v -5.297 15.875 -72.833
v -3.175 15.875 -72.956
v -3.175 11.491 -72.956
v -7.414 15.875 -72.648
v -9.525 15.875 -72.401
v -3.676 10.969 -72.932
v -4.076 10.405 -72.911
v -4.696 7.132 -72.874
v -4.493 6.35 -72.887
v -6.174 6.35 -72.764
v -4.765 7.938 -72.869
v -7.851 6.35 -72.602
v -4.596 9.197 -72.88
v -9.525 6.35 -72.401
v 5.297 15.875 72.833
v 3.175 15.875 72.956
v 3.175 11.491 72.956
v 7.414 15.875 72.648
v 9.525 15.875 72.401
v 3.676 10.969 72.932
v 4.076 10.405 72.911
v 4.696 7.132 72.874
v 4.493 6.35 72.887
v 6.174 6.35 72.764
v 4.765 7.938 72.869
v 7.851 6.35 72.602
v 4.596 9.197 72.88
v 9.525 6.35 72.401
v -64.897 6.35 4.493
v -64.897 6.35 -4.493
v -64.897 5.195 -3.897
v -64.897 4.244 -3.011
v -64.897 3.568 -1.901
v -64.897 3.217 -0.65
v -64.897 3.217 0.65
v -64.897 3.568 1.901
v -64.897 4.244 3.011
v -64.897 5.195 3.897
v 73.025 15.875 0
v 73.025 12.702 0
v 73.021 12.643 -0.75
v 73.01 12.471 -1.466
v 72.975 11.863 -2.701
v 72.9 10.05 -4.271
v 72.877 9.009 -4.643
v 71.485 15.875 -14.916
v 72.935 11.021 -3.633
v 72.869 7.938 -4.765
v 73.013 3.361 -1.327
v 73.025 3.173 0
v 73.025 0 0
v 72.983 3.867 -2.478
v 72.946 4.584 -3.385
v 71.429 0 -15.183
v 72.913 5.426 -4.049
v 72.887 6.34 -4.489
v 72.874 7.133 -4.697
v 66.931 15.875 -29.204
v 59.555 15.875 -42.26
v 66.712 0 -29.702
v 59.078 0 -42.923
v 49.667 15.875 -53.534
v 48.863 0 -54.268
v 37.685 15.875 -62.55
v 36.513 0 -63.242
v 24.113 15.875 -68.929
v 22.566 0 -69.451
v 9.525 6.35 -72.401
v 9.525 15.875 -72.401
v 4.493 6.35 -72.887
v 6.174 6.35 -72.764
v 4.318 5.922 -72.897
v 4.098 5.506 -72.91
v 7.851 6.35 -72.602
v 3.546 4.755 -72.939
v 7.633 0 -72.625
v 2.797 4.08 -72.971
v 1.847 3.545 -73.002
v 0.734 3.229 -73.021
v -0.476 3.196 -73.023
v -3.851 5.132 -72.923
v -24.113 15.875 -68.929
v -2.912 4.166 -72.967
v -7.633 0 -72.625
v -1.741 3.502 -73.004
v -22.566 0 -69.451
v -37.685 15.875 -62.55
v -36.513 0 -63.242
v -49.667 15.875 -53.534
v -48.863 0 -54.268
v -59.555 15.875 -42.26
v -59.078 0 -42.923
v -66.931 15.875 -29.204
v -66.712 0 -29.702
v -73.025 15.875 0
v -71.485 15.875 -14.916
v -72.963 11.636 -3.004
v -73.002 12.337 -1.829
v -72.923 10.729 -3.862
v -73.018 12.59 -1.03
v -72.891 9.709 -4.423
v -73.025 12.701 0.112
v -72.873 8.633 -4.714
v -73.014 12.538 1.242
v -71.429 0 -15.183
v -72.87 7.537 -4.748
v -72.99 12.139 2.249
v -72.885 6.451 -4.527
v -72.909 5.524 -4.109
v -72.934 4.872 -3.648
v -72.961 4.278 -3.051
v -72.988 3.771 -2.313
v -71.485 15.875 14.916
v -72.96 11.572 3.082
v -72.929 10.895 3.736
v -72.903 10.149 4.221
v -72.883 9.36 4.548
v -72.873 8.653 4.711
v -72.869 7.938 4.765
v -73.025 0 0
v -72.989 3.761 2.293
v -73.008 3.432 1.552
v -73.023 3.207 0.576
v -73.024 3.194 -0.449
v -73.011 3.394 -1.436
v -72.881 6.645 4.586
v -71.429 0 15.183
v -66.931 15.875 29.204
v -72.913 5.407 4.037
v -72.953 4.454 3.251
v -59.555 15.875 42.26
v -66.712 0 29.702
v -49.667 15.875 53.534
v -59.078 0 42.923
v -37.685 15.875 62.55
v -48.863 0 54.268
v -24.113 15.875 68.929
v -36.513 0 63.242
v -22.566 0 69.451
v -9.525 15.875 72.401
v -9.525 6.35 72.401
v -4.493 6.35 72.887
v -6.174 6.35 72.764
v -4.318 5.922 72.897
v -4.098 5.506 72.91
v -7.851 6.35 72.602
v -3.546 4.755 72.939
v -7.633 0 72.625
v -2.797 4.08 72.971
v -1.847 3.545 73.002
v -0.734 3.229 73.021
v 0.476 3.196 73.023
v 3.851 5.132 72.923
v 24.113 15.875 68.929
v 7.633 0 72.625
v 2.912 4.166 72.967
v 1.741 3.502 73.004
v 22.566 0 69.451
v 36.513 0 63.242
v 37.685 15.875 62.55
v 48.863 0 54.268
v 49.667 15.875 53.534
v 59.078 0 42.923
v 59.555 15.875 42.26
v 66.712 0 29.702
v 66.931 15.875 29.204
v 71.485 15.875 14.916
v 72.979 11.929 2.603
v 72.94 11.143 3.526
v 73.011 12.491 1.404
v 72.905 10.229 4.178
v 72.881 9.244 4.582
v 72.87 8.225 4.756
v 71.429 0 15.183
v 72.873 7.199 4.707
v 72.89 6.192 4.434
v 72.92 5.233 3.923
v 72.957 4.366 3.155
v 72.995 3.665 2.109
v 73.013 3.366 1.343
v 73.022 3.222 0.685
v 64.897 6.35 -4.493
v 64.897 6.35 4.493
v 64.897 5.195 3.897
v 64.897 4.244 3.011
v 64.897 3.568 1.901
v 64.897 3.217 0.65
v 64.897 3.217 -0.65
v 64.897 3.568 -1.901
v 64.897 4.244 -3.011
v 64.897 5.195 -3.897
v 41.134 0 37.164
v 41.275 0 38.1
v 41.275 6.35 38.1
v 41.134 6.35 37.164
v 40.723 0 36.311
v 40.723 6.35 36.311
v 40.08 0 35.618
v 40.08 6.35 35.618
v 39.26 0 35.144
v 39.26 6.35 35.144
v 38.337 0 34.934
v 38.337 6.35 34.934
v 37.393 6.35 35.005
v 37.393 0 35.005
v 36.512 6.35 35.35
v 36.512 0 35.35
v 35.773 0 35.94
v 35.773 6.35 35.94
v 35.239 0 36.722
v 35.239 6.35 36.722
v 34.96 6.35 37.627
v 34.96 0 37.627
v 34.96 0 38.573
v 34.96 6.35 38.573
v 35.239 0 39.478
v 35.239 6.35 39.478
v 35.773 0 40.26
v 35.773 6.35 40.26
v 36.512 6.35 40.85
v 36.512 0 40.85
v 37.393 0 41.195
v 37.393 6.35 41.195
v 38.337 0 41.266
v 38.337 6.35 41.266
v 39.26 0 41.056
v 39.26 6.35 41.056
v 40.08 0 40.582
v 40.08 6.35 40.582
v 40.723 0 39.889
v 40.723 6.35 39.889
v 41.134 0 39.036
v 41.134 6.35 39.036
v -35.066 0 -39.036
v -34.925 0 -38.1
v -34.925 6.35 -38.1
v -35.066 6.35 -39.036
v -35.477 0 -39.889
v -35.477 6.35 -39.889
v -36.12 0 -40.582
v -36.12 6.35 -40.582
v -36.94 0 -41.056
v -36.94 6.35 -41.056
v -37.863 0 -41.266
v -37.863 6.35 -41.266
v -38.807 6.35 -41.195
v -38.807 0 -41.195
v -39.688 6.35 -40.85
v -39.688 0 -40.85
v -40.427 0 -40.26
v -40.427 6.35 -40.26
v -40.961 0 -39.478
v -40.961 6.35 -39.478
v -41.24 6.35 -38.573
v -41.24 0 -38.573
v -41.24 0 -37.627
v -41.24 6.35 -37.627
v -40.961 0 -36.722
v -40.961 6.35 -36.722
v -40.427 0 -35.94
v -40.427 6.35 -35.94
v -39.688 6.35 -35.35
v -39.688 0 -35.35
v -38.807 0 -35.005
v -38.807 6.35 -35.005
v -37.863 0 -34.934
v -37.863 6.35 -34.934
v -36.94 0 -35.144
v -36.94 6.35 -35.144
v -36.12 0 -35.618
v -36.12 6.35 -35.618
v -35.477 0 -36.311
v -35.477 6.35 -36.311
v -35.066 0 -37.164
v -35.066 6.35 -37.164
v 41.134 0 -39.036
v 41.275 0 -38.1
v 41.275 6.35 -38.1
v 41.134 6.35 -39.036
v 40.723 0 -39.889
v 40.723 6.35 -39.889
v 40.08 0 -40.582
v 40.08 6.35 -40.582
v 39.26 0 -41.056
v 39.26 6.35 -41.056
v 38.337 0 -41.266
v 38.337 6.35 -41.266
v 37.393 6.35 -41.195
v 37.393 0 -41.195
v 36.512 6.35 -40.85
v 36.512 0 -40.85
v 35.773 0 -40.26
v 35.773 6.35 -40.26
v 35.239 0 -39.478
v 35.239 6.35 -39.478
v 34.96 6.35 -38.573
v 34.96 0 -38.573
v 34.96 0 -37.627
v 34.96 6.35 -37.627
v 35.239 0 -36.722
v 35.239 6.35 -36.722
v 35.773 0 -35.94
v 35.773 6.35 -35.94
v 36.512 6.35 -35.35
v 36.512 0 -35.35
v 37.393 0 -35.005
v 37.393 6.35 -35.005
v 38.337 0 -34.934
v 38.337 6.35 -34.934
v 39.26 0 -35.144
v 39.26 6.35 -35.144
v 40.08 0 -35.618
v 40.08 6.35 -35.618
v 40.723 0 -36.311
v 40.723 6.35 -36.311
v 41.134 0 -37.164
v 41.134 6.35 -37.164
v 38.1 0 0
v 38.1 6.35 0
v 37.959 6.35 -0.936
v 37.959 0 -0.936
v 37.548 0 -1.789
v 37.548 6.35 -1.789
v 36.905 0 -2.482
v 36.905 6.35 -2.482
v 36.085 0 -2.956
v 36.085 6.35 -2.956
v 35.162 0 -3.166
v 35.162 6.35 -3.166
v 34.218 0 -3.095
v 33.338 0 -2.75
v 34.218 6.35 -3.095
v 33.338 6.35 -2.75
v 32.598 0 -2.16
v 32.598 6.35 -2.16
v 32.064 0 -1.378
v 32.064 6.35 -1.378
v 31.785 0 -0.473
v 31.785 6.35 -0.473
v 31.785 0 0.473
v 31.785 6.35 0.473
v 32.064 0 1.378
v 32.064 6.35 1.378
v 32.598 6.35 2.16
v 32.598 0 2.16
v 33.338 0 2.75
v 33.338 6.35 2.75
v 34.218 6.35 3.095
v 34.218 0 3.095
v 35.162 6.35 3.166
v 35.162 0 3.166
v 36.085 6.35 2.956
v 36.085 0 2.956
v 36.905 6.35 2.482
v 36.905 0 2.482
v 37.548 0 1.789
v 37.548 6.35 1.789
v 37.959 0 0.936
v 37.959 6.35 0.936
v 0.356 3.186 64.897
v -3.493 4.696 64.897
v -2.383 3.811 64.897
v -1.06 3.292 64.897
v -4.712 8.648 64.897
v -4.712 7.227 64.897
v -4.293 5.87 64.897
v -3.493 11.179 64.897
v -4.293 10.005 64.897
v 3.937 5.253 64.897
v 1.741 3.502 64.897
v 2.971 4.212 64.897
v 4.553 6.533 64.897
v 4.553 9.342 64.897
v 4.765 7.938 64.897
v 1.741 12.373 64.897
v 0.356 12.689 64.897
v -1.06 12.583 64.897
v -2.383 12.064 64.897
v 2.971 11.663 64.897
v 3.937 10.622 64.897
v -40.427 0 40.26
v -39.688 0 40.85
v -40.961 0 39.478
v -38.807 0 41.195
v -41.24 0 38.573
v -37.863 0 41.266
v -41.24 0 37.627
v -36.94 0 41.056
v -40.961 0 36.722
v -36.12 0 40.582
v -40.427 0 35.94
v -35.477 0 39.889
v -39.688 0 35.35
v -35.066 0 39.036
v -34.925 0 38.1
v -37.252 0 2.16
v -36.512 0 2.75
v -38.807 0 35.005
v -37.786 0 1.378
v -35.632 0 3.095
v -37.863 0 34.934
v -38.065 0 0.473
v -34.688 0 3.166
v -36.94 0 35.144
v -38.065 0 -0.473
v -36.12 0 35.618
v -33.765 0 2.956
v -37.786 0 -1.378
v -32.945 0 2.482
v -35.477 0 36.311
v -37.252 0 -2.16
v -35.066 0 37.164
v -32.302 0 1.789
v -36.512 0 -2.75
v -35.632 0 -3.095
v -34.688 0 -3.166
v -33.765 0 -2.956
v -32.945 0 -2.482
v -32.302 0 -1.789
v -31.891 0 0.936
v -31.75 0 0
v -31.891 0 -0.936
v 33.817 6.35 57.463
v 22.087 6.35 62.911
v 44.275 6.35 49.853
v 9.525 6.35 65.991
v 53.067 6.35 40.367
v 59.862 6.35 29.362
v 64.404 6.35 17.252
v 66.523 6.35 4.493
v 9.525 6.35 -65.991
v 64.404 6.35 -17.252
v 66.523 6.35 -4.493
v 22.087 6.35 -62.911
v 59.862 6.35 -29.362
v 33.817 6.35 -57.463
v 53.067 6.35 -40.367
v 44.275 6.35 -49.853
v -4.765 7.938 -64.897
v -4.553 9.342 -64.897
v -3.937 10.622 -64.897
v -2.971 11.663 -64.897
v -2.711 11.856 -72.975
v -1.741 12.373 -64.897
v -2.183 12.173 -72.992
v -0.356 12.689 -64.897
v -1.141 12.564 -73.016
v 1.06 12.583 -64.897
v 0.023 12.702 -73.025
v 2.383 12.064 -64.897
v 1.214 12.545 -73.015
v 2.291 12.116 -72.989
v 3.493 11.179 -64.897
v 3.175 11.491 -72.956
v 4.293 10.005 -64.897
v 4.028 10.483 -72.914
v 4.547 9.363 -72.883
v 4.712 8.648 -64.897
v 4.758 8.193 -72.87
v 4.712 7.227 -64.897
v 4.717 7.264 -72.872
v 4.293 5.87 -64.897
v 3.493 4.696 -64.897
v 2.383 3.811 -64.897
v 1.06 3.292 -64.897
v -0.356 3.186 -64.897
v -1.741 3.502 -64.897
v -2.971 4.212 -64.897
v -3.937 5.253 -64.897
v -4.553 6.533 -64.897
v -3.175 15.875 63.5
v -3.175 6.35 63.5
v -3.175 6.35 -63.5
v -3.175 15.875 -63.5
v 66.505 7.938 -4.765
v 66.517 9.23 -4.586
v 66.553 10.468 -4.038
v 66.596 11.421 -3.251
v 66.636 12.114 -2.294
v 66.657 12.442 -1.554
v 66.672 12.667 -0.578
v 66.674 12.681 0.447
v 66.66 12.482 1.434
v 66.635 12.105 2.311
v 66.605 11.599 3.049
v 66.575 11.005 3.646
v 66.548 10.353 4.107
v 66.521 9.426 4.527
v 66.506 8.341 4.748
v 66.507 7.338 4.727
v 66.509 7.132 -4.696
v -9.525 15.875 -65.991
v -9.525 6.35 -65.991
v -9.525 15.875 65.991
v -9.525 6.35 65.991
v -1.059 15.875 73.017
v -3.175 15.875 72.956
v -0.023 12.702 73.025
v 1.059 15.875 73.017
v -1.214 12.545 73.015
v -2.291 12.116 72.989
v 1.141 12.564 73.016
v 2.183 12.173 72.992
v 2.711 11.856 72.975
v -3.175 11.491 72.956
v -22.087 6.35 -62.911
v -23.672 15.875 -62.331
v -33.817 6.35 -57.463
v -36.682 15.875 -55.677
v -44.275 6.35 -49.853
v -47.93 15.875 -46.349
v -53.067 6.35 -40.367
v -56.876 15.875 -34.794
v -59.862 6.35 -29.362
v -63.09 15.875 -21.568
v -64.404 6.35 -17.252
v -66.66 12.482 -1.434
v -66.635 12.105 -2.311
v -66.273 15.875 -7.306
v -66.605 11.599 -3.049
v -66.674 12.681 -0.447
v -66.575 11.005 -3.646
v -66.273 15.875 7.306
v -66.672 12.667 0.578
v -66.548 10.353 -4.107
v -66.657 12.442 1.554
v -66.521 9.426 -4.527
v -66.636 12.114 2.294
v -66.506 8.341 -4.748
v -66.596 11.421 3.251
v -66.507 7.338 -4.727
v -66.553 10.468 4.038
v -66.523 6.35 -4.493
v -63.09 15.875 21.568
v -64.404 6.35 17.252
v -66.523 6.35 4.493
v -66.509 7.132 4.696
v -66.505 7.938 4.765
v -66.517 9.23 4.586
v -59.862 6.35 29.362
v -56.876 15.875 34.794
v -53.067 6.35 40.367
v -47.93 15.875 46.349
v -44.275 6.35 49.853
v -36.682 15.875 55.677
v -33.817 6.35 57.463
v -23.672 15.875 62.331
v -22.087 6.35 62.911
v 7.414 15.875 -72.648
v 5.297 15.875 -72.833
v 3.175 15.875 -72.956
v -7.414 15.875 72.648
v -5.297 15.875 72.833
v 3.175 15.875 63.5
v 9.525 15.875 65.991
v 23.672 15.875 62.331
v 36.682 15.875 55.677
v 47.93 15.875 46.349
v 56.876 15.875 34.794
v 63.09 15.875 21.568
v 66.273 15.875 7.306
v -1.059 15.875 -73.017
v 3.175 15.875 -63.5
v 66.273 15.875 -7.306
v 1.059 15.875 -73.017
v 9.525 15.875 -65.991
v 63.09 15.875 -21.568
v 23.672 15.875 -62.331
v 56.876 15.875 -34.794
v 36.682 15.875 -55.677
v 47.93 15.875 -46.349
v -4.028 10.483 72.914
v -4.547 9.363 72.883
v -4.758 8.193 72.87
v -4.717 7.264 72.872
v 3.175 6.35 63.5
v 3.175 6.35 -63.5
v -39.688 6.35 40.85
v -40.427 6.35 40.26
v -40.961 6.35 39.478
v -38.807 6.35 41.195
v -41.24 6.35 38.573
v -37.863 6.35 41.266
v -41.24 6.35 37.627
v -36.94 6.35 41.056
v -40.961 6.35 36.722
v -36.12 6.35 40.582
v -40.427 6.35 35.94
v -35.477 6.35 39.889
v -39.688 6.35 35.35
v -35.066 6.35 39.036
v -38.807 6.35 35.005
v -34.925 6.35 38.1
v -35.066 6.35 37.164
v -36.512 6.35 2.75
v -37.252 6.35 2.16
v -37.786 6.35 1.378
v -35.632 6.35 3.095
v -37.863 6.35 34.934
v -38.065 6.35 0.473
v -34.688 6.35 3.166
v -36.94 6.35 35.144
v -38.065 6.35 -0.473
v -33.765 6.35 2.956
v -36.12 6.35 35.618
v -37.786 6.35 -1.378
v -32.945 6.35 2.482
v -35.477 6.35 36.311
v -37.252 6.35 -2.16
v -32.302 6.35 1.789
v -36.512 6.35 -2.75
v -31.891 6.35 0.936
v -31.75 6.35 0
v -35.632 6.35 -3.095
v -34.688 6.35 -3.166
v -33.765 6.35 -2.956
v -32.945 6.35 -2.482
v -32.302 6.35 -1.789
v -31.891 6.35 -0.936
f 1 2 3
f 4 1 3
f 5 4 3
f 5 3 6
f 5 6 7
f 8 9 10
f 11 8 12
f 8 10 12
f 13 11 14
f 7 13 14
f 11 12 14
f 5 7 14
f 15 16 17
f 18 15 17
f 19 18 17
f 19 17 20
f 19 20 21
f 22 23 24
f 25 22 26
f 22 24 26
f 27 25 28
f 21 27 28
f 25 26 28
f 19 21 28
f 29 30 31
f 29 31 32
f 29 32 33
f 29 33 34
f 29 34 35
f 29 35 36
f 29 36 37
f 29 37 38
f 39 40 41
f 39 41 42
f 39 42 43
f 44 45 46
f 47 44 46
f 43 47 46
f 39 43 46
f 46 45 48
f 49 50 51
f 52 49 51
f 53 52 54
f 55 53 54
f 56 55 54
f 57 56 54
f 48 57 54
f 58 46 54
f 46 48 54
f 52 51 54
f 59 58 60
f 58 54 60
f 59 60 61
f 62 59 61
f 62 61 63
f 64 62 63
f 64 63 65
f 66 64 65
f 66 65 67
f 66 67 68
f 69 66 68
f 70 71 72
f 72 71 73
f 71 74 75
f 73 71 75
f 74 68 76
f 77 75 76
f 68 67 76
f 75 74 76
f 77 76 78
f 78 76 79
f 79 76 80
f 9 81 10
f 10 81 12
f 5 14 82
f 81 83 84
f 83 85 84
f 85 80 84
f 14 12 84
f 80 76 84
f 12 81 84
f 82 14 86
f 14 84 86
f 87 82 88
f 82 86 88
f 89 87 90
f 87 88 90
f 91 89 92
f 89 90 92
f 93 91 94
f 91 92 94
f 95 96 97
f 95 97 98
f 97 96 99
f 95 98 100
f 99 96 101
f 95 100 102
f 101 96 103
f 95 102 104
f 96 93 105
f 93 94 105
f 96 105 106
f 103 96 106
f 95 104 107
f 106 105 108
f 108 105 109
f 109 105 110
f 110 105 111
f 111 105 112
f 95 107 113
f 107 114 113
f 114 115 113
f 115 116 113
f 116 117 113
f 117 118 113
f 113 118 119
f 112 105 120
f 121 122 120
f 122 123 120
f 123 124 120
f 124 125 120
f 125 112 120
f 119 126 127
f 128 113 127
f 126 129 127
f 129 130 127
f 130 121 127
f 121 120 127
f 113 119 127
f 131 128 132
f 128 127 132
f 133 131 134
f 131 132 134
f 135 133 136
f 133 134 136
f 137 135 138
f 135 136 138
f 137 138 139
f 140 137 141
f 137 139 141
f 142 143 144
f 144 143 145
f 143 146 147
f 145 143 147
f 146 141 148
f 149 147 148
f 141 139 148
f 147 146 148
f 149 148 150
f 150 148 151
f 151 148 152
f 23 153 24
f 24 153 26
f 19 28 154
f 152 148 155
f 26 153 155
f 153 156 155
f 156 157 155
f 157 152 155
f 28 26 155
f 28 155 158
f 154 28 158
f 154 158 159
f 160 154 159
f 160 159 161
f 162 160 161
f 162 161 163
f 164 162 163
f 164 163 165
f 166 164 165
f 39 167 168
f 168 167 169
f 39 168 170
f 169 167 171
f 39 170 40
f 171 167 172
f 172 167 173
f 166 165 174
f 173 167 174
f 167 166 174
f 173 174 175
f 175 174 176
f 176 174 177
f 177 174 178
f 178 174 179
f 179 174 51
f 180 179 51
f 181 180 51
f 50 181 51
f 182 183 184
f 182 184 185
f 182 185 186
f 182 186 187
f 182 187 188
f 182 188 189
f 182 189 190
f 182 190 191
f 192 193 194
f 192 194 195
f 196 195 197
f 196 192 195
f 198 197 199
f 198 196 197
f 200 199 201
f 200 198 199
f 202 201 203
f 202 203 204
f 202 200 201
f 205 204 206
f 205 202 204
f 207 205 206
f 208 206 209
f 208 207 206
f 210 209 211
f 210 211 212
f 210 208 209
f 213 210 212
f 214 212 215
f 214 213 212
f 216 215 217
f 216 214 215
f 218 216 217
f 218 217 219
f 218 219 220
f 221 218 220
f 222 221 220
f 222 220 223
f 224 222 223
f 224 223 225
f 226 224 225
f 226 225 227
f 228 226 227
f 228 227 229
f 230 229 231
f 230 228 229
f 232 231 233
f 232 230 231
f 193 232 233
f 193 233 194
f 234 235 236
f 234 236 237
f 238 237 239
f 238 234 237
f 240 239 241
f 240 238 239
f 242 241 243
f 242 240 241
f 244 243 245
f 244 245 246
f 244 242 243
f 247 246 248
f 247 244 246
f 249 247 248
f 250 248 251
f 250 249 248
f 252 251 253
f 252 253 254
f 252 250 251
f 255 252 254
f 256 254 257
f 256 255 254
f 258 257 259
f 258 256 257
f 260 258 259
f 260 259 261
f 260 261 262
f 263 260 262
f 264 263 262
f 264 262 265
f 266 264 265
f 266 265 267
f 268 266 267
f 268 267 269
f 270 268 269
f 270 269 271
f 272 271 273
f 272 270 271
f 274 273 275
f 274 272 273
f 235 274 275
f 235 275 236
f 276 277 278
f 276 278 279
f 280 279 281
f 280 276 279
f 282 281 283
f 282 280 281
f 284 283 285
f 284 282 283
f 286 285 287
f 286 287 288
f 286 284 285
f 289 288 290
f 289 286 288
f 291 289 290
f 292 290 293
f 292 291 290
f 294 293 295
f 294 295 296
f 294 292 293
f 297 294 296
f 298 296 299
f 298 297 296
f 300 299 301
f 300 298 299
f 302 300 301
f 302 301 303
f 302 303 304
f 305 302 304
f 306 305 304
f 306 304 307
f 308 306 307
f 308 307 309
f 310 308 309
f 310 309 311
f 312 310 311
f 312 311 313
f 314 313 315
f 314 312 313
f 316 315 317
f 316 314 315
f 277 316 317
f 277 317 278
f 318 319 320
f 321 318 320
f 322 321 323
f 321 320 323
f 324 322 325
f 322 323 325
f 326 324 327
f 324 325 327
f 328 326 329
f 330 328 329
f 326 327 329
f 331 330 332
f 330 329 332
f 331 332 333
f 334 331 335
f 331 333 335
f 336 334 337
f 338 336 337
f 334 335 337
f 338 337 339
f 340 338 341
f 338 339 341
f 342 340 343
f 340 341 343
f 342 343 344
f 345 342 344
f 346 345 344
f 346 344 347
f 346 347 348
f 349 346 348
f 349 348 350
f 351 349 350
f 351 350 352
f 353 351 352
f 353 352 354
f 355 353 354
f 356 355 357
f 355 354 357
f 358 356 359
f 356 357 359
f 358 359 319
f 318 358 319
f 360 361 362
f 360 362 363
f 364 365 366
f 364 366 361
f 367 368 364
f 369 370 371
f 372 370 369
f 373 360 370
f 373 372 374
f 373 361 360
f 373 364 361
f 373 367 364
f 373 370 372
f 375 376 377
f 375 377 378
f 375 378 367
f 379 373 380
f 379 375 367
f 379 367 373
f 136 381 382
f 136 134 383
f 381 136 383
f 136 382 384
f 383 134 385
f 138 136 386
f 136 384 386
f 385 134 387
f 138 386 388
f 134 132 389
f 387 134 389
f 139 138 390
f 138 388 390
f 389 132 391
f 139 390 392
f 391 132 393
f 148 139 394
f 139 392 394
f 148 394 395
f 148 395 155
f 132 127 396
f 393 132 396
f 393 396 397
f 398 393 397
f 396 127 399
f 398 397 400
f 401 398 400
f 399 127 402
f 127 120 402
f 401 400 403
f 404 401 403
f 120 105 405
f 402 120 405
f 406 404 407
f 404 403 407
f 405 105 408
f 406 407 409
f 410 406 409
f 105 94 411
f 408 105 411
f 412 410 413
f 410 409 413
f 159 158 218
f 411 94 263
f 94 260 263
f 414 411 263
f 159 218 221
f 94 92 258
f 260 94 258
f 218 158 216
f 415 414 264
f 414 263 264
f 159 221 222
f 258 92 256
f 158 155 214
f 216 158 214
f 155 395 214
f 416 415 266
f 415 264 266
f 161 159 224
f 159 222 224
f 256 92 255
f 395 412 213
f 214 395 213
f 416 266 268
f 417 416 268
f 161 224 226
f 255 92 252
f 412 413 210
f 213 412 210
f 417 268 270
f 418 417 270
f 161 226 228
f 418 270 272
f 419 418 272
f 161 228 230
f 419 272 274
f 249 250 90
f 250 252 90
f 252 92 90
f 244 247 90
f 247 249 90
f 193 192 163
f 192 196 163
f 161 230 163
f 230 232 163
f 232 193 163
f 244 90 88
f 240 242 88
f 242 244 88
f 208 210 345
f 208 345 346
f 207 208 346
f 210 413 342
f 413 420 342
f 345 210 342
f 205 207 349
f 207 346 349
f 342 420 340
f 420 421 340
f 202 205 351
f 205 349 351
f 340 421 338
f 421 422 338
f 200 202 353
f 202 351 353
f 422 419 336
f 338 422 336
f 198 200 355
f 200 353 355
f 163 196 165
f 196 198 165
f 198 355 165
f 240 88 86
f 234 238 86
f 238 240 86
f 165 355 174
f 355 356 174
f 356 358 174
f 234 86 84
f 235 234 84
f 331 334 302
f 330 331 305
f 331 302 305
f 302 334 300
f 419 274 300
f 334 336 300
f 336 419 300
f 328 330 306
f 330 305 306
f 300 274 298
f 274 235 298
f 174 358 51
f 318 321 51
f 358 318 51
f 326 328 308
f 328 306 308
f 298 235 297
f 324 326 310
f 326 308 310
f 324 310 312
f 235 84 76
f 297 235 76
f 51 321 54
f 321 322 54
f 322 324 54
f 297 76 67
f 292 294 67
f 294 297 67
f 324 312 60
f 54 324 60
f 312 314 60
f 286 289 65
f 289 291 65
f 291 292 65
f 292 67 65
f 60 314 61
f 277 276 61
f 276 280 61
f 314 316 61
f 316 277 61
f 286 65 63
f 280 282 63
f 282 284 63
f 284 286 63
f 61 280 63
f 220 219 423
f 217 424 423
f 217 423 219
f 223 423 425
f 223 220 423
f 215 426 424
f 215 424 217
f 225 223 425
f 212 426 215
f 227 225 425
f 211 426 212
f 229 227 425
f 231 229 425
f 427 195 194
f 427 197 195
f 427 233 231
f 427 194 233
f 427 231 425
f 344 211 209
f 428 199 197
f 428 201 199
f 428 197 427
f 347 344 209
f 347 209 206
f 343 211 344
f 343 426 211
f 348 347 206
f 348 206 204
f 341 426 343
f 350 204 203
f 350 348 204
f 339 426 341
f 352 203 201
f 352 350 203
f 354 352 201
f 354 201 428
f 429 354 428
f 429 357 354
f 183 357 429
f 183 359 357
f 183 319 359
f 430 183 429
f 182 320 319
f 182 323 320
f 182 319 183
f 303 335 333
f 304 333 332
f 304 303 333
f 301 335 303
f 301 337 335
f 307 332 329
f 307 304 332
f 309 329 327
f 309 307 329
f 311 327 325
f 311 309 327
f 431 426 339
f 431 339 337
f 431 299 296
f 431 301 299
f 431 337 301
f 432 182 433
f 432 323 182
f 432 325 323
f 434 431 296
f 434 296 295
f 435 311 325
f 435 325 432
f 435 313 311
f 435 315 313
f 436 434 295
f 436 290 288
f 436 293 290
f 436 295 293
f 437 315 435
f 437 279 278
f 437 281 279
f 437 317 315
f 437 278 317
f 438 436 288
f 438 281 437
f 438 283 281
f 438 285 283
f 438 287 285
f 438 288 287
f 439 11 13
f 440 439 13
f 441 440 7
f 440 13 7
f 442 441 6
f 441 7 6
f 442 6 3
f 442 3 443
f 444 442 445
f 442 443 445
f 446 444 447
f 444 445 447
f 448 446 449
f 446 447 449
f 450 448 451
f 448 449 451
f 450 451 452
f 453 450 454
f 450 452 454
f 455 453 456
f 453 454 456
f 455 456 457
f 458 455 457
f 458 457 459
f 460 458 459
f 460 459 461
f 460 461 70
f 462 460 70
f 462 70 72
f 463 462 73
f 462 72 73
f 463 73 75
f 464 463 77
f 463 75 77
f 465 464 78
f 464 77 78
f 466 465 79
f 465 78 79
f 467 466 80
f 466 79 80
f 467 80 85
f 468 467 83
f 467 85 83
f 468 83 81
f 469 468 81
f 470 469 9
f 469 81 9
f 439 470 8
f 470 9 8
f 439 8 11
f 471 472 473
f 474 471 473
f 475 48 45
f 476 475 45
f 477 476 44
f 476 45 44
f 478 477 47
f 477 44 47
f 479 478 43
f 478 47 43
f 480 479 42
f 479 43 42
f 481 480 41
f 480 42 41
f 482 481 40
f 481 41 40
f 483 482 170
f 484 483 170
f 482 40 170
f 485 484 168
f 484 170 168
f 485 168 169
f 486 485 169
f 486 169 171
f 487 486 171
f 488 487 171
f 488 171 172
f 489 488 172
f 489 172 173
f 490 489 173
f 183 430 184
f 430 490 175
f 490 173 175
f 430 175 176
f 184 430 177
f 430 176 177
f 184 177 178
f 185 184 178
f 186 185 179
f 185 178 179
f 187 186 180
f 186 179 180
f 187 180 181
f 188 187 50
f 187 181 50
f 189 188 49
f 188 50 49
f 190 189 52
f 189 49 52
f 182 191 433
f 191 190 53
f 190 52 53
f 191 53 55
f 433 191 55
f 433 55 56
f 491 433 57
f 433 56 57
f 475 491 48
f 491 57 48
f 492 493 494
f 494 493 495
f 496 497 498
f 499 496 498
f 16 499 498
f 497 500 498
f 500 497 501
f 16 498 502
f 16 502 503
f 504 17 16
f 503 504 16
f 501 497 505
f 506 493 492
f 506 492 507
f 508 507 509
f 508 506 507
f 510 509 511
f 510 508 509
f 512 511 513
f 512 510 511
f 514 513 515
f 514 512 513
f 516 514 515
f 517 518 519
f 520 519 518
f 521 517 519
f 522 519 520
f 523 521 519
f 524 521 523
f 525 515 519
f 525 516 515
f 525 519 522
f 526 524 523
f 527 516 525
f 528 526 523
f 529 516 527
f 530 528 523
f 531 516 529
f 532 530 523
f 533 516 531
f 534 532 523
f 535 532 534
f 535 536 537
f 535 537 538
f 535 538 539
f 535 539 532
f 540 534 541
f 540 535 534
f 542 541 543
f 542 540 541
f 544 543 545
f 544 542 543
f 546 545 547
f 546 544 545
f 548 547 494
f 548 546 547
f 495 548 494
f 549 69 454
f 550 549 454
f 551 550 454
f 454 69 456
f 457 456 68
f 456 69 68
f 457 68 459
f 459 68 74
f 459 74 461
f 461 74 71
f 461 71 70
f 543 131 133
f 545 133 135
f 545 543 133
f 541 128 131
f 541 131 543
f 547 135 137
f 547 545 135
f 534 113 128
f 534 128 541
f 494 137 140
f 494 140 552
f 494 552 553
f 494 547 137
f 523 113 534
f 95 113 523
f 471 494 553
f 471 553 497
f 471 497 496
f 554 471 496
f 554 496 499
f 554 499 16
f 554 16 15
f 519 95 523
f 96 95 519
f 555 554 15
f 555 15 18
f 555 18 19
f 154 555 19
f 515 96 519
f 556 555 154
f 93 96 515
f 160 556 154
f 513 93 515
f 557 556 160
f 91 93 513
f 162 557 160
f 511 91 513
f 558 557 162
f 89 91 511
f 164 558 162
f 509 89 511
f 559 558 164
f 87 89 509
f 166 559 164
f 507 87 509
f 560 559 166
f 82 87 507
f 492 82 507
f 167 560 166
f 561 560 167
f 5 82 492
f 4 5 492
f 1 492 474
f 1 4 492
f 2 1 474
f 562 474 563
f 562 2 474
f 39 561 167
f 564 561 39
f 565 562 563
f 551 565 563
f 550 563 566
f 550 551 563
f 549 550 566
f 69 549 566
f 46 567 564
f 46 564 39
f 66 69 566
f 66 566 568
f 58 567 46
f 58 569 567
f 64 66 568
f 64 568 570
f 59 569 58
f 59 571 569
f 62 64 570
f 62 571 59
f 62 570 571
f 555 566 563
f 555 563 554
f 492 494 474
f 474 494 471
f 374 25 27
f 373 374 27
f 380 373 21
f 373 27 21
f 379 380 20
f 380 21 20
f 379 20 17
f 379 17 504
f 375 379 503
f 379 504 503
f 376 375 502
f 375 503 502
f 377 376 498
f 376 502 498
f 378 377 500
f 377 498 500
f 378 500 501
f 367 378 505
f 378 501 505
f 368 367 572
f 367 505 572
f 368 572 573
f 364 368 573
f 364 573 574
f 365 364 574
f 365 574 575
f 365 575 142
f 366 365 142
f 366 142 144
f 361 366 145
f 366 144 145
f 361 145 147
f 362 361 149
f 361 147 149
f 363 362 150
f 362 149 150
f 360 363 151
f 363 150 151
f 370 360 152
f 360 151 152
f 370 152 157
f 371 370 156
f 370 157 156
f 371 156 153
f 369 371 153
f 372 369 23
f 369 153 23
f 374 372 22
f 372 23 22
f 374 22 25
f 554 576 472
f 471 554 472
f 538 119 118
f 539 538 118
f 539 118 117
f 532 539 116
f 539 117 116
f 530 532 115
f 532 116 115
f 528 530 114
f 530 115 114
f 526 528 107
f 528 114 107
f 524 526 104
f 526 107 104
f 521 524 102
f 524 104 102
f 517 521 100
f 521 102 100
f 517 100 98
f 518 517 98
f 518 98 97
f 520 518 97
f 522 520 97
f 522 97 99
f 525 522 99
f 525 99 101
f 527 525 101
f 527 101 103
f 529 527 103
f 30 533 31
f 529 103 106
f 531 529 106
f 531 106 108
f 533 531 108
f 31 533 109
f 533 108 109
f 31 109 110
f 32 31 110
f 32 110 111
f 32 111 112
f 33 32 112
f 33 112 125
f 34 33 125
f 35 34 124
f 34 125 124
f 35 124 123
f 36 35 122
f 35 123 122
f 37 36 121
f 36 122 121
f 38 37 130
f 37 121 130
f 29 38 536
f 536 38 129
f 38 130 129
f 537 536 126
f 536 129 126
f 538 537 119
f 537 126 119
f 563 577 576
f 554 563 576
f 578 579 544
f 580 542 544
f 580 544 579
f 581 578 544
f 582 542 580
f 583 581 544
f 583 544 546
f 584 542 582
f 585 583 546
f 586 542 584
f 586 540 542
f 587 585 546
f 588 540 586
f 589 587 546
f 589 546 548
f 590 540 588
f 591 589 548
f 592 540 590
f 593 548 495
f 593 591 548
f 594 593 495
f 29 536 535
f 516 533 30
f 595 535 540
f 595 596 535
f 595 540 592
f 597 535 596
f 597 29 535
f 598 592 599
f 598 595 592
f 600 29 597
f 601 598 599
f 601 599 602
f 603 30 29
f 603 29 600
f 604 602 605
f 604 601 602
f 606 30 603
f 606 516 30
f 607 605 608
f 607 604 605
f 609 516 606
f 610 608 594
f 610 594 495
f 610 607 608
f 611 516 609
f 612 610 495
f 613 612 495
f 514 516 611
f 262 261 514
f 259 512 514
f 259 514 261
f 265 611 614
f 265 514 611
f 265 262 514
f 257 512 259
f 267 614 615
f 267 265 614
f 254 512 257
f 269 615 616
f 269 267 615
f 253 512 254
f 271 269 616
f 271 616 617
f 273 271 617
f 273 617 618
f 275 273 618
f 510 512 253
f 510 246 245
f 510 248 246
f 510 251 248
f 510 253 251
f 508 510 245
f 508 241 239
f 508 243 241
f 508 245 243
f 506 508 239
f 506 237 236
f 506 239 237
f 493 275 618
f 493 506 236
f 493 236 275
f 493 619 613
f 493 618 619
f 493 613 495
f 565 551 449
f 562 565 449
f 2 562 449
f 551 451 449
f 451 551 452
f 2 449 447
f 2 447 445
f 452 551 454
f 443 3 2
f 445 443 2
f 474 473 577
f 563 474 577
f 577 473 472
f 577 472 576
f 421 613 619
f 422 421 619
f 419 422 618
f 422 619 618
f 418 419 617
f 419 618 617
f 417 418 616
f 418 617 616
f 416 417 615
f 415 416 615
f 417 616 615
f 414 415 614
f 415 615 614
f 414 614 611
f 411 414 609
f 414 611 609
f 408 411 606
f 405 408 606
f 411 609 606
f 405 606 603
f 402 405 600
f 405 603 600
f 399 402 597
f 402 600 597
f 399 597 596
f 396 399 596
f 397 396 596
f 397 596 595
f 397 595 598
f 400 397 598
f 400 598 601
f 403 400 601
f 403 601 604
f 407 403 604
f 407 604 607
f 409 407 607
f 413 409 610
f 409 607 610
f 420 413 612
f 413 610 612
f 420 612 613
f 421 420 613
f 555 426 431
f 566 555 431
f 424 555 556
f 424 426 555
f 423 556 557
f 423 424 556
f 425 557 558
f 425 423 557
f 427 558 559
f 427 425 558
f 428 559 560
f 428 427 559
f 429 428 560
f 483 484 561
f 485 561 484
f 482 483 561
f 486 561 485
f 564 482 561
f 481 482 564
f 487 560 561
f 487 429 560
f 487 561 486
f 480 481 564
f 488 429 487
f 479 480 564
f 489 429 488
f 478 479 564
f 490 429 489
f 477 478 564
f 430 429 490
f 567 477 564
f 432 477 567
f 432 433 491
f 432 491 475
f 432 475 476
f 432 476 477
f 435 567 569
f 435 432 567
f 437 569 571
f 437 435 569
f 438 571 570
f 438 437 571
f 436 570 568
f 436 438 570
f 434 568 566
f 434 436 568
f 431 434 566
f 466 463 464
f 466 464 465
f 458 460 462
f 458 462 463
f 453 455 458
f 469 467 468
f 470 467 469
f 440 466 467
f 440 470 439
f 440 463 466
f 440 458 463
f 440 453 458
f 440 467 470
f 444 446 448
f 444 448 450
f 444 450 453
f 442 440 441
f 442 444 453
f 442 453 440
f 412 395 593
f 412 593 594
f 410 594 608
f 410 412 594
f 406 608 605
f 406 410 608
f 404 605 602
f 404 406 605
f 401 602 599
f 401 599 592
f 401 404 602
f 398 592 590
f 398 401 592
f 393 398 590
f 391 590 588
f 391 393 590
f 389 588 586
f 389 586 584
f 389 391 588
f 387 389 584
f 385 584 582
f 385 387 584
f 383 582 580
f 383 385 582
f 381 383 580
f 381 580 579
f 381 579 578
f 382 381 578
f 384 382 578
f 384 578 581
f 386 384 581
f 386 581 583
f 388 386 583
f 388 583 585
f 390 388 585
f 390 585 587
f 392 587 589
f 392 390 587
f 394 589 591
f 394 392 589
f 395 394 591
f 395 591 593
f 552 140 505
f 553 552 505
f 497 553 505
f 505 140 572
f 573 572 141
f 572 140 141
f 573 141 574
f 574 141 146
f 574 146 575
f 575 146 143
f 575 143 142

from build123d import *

# Parameters (mm, degrees)
SKETCH5_R           = 73.025
SKETCH5_R_2         = 3.175
PLATEBASE_DEPTH     = 6.35
PLATETOP_DEPTH      = 9.525
SKETCH9_R           = 73.025
SKETCH9_R_2         = 66.675
PLATEWALLS_DEPTH    = 9.525
SKETCH13_R          = 3.175
RIGHTTHRUHOLE_DEPTH = 6.35
SKETCH14_R          = 3.175
LEFTTHRUHOLE_DEPTH  = 6.35
BOSS_EXTRUDE1_DEPTH = 9.525
SKETCH16_R          = 4.765
INSERTHOLE_DEPTH    = 8.128
INSERTHOLES_COUNT   = 4


with BuildPart() as part:
    # Sketch5 → PlateBase (new body)
    with BuildSketch(Plane(origin=(0, 0, 0), x_dir=(1, 0, 0), z_dir=(0, 1, 0))):
        Circle(SKETCH5_R)
        with Locations((38.1, 38.1)):
            Circle(SKETCH5_R_2, mode=Mode.SUBTRACT)
        with Locations((38.1, -38.1)):
            Circle(SKETCH5_R_2, mode=Mode.SUBTRACT)
        with Locations((-38.1, 38.1)):
            Circle(SKETCH5_R_2, mode=Mode.SUBTRACT)
        with Locations((-38.1, -38.1)):
            Circle(SKETCH5_R_2, mode=Mode.SUBTRACT)
    extrude(amount=PLATEBASE_DEPTH)

    # Sketch6 → PlateTop (add)
    with BuildSketch(Plane(origin=(0, 6.35, 0), x_dir=(1, 0, 0), z_dir=(0, 1, 0))):
        with BuildLine():
            Line((-3.175, 0), (-3.175, 72.955945611))
            ThreePointArc((-3.175, 72.955945611), (-6.35605636, 72.747860261), (-9.525, 72.401139494))
            Line((-9.525, 72.401139494), (-9.525, 0))
            Line((-9.525, 0), (-9.525, -72.401139494))
            ThreePointArc((-9.525, -72.401139494), (-6.35605636, -72.747860261), (-3.175, -72.955945611))
            Line((-3.175, -72.955945611), (-3.175, 0))
        make_face()
        with BuildLine():
            Line((3.175, 72.955945611), (3.175, 0))
            Line((3.175, 0), (3.175, -72.955945611))
            ThreePointArc((3.175, -72.955945611), (6.35605636, -72.747860261), (9.525, -72.401139494))
            Line((9.525, -72.401139494), (9.525, 0))
            Line((9.525, 0), (9.525, 72.401139494))
            ThreePointArc((9.525, 72.401139494), (6.35605636, 72.747860261), (3.175, 72.955945611))
        make_face()
    extrude(amount=PLATETOP_DEPTH)

    # Sketch9 → PlateWalls (add)
    with BuildSketch(Plane(origin=(0, 6.35, 0), x_dir=(1, 0, 0), z_dir=(0, 1, 0))):
        Circle(SKETCH9_R)
        Circle(SKETCH9_R_2, mode=Mode.SUBTRACT)
    extrude(amount=PLATEWALLS_DEPTH)

    # Sketch13 → RightThruHole (cut)
    with BuildSketch(Plane(origin=(0, 6.35, 0), x_dir=(1, 0, 0), z_dir=(0, 1, 0))):
        with Locations((34.925, 0)):
            Circle(SKETCH13_R)
    extrude(amount=-RIGHTTHRUHOLE_DEPTH, mode=Mode.SUBTRACT)

    # Sketch14 → LeftThruHole (cut)
    with BuildSketch(Plane(origin=(0, 6.35, 0), x_dir=(1, 0, 0), z_dir=(0, 1, 0))):
        with Locations((-34.925, 0)):
            Circle(SKETCH14_R)
    extrude(amount=-LEFTTHRUHOLE_DEPTH, mode=Mode.SUBTRACT)

    # Sketch15 → Boss-Extrude1 (add)
    with BuildSketch(Plane(origin=(0, 6.35, 0), x_dir=(1, 0, 0), z_dir=(0, 1, 0))):
        with BuildLine():
            Line((-3.175, 63.5), (3.175, 63.5))
            Line((3.175, 63.5), (3.175, 66.599361859))
            ThreePointArc((3.175, 66.599361859), (0, 66.675), (-3.175, 66.599361859))
            Line((-3.175, 66.599361859), (-3.175, 63.5))
        make_face()
        with BuildLine():
            Line((-3.175, -63.5), (-3.175, -66.599361859))
            ThreePointArc((-3.175, -66.599361859), (0, -66.675), (3.175, -66.599361859))
            Line((3.175, -66.599361859), (3.175, -63.5))
            Line((3.175, -63.5), (-3.175, -63.5))
        make_face()
    extrude(amount=BOSS_EXTRUDE1_DEPTH)

    # Sketch16 → InsertHole (cut)
    with BuildSketch(Plane.XY.offset(73.025)):
        with Locations((0, 7.9375)):
            Circle(SKETCH16_R)
    inserthole = extrude(amount=-INSERTHOLE_DEPTH, mode=Mode.SUBTRACT)

    # InsertHoles: InsertHole ×4 about axis
    insertholes_axis = Axis((0, 0, 0), (0, 1, 0))
    for i in range(1, INSERTHOLES_COUNT):
        add(inserthole.rotate(insertholes_axis, i * 360 / INSERTHOLES_COUNT), mode=Mode.SUBTRACT)


solid = part.part
